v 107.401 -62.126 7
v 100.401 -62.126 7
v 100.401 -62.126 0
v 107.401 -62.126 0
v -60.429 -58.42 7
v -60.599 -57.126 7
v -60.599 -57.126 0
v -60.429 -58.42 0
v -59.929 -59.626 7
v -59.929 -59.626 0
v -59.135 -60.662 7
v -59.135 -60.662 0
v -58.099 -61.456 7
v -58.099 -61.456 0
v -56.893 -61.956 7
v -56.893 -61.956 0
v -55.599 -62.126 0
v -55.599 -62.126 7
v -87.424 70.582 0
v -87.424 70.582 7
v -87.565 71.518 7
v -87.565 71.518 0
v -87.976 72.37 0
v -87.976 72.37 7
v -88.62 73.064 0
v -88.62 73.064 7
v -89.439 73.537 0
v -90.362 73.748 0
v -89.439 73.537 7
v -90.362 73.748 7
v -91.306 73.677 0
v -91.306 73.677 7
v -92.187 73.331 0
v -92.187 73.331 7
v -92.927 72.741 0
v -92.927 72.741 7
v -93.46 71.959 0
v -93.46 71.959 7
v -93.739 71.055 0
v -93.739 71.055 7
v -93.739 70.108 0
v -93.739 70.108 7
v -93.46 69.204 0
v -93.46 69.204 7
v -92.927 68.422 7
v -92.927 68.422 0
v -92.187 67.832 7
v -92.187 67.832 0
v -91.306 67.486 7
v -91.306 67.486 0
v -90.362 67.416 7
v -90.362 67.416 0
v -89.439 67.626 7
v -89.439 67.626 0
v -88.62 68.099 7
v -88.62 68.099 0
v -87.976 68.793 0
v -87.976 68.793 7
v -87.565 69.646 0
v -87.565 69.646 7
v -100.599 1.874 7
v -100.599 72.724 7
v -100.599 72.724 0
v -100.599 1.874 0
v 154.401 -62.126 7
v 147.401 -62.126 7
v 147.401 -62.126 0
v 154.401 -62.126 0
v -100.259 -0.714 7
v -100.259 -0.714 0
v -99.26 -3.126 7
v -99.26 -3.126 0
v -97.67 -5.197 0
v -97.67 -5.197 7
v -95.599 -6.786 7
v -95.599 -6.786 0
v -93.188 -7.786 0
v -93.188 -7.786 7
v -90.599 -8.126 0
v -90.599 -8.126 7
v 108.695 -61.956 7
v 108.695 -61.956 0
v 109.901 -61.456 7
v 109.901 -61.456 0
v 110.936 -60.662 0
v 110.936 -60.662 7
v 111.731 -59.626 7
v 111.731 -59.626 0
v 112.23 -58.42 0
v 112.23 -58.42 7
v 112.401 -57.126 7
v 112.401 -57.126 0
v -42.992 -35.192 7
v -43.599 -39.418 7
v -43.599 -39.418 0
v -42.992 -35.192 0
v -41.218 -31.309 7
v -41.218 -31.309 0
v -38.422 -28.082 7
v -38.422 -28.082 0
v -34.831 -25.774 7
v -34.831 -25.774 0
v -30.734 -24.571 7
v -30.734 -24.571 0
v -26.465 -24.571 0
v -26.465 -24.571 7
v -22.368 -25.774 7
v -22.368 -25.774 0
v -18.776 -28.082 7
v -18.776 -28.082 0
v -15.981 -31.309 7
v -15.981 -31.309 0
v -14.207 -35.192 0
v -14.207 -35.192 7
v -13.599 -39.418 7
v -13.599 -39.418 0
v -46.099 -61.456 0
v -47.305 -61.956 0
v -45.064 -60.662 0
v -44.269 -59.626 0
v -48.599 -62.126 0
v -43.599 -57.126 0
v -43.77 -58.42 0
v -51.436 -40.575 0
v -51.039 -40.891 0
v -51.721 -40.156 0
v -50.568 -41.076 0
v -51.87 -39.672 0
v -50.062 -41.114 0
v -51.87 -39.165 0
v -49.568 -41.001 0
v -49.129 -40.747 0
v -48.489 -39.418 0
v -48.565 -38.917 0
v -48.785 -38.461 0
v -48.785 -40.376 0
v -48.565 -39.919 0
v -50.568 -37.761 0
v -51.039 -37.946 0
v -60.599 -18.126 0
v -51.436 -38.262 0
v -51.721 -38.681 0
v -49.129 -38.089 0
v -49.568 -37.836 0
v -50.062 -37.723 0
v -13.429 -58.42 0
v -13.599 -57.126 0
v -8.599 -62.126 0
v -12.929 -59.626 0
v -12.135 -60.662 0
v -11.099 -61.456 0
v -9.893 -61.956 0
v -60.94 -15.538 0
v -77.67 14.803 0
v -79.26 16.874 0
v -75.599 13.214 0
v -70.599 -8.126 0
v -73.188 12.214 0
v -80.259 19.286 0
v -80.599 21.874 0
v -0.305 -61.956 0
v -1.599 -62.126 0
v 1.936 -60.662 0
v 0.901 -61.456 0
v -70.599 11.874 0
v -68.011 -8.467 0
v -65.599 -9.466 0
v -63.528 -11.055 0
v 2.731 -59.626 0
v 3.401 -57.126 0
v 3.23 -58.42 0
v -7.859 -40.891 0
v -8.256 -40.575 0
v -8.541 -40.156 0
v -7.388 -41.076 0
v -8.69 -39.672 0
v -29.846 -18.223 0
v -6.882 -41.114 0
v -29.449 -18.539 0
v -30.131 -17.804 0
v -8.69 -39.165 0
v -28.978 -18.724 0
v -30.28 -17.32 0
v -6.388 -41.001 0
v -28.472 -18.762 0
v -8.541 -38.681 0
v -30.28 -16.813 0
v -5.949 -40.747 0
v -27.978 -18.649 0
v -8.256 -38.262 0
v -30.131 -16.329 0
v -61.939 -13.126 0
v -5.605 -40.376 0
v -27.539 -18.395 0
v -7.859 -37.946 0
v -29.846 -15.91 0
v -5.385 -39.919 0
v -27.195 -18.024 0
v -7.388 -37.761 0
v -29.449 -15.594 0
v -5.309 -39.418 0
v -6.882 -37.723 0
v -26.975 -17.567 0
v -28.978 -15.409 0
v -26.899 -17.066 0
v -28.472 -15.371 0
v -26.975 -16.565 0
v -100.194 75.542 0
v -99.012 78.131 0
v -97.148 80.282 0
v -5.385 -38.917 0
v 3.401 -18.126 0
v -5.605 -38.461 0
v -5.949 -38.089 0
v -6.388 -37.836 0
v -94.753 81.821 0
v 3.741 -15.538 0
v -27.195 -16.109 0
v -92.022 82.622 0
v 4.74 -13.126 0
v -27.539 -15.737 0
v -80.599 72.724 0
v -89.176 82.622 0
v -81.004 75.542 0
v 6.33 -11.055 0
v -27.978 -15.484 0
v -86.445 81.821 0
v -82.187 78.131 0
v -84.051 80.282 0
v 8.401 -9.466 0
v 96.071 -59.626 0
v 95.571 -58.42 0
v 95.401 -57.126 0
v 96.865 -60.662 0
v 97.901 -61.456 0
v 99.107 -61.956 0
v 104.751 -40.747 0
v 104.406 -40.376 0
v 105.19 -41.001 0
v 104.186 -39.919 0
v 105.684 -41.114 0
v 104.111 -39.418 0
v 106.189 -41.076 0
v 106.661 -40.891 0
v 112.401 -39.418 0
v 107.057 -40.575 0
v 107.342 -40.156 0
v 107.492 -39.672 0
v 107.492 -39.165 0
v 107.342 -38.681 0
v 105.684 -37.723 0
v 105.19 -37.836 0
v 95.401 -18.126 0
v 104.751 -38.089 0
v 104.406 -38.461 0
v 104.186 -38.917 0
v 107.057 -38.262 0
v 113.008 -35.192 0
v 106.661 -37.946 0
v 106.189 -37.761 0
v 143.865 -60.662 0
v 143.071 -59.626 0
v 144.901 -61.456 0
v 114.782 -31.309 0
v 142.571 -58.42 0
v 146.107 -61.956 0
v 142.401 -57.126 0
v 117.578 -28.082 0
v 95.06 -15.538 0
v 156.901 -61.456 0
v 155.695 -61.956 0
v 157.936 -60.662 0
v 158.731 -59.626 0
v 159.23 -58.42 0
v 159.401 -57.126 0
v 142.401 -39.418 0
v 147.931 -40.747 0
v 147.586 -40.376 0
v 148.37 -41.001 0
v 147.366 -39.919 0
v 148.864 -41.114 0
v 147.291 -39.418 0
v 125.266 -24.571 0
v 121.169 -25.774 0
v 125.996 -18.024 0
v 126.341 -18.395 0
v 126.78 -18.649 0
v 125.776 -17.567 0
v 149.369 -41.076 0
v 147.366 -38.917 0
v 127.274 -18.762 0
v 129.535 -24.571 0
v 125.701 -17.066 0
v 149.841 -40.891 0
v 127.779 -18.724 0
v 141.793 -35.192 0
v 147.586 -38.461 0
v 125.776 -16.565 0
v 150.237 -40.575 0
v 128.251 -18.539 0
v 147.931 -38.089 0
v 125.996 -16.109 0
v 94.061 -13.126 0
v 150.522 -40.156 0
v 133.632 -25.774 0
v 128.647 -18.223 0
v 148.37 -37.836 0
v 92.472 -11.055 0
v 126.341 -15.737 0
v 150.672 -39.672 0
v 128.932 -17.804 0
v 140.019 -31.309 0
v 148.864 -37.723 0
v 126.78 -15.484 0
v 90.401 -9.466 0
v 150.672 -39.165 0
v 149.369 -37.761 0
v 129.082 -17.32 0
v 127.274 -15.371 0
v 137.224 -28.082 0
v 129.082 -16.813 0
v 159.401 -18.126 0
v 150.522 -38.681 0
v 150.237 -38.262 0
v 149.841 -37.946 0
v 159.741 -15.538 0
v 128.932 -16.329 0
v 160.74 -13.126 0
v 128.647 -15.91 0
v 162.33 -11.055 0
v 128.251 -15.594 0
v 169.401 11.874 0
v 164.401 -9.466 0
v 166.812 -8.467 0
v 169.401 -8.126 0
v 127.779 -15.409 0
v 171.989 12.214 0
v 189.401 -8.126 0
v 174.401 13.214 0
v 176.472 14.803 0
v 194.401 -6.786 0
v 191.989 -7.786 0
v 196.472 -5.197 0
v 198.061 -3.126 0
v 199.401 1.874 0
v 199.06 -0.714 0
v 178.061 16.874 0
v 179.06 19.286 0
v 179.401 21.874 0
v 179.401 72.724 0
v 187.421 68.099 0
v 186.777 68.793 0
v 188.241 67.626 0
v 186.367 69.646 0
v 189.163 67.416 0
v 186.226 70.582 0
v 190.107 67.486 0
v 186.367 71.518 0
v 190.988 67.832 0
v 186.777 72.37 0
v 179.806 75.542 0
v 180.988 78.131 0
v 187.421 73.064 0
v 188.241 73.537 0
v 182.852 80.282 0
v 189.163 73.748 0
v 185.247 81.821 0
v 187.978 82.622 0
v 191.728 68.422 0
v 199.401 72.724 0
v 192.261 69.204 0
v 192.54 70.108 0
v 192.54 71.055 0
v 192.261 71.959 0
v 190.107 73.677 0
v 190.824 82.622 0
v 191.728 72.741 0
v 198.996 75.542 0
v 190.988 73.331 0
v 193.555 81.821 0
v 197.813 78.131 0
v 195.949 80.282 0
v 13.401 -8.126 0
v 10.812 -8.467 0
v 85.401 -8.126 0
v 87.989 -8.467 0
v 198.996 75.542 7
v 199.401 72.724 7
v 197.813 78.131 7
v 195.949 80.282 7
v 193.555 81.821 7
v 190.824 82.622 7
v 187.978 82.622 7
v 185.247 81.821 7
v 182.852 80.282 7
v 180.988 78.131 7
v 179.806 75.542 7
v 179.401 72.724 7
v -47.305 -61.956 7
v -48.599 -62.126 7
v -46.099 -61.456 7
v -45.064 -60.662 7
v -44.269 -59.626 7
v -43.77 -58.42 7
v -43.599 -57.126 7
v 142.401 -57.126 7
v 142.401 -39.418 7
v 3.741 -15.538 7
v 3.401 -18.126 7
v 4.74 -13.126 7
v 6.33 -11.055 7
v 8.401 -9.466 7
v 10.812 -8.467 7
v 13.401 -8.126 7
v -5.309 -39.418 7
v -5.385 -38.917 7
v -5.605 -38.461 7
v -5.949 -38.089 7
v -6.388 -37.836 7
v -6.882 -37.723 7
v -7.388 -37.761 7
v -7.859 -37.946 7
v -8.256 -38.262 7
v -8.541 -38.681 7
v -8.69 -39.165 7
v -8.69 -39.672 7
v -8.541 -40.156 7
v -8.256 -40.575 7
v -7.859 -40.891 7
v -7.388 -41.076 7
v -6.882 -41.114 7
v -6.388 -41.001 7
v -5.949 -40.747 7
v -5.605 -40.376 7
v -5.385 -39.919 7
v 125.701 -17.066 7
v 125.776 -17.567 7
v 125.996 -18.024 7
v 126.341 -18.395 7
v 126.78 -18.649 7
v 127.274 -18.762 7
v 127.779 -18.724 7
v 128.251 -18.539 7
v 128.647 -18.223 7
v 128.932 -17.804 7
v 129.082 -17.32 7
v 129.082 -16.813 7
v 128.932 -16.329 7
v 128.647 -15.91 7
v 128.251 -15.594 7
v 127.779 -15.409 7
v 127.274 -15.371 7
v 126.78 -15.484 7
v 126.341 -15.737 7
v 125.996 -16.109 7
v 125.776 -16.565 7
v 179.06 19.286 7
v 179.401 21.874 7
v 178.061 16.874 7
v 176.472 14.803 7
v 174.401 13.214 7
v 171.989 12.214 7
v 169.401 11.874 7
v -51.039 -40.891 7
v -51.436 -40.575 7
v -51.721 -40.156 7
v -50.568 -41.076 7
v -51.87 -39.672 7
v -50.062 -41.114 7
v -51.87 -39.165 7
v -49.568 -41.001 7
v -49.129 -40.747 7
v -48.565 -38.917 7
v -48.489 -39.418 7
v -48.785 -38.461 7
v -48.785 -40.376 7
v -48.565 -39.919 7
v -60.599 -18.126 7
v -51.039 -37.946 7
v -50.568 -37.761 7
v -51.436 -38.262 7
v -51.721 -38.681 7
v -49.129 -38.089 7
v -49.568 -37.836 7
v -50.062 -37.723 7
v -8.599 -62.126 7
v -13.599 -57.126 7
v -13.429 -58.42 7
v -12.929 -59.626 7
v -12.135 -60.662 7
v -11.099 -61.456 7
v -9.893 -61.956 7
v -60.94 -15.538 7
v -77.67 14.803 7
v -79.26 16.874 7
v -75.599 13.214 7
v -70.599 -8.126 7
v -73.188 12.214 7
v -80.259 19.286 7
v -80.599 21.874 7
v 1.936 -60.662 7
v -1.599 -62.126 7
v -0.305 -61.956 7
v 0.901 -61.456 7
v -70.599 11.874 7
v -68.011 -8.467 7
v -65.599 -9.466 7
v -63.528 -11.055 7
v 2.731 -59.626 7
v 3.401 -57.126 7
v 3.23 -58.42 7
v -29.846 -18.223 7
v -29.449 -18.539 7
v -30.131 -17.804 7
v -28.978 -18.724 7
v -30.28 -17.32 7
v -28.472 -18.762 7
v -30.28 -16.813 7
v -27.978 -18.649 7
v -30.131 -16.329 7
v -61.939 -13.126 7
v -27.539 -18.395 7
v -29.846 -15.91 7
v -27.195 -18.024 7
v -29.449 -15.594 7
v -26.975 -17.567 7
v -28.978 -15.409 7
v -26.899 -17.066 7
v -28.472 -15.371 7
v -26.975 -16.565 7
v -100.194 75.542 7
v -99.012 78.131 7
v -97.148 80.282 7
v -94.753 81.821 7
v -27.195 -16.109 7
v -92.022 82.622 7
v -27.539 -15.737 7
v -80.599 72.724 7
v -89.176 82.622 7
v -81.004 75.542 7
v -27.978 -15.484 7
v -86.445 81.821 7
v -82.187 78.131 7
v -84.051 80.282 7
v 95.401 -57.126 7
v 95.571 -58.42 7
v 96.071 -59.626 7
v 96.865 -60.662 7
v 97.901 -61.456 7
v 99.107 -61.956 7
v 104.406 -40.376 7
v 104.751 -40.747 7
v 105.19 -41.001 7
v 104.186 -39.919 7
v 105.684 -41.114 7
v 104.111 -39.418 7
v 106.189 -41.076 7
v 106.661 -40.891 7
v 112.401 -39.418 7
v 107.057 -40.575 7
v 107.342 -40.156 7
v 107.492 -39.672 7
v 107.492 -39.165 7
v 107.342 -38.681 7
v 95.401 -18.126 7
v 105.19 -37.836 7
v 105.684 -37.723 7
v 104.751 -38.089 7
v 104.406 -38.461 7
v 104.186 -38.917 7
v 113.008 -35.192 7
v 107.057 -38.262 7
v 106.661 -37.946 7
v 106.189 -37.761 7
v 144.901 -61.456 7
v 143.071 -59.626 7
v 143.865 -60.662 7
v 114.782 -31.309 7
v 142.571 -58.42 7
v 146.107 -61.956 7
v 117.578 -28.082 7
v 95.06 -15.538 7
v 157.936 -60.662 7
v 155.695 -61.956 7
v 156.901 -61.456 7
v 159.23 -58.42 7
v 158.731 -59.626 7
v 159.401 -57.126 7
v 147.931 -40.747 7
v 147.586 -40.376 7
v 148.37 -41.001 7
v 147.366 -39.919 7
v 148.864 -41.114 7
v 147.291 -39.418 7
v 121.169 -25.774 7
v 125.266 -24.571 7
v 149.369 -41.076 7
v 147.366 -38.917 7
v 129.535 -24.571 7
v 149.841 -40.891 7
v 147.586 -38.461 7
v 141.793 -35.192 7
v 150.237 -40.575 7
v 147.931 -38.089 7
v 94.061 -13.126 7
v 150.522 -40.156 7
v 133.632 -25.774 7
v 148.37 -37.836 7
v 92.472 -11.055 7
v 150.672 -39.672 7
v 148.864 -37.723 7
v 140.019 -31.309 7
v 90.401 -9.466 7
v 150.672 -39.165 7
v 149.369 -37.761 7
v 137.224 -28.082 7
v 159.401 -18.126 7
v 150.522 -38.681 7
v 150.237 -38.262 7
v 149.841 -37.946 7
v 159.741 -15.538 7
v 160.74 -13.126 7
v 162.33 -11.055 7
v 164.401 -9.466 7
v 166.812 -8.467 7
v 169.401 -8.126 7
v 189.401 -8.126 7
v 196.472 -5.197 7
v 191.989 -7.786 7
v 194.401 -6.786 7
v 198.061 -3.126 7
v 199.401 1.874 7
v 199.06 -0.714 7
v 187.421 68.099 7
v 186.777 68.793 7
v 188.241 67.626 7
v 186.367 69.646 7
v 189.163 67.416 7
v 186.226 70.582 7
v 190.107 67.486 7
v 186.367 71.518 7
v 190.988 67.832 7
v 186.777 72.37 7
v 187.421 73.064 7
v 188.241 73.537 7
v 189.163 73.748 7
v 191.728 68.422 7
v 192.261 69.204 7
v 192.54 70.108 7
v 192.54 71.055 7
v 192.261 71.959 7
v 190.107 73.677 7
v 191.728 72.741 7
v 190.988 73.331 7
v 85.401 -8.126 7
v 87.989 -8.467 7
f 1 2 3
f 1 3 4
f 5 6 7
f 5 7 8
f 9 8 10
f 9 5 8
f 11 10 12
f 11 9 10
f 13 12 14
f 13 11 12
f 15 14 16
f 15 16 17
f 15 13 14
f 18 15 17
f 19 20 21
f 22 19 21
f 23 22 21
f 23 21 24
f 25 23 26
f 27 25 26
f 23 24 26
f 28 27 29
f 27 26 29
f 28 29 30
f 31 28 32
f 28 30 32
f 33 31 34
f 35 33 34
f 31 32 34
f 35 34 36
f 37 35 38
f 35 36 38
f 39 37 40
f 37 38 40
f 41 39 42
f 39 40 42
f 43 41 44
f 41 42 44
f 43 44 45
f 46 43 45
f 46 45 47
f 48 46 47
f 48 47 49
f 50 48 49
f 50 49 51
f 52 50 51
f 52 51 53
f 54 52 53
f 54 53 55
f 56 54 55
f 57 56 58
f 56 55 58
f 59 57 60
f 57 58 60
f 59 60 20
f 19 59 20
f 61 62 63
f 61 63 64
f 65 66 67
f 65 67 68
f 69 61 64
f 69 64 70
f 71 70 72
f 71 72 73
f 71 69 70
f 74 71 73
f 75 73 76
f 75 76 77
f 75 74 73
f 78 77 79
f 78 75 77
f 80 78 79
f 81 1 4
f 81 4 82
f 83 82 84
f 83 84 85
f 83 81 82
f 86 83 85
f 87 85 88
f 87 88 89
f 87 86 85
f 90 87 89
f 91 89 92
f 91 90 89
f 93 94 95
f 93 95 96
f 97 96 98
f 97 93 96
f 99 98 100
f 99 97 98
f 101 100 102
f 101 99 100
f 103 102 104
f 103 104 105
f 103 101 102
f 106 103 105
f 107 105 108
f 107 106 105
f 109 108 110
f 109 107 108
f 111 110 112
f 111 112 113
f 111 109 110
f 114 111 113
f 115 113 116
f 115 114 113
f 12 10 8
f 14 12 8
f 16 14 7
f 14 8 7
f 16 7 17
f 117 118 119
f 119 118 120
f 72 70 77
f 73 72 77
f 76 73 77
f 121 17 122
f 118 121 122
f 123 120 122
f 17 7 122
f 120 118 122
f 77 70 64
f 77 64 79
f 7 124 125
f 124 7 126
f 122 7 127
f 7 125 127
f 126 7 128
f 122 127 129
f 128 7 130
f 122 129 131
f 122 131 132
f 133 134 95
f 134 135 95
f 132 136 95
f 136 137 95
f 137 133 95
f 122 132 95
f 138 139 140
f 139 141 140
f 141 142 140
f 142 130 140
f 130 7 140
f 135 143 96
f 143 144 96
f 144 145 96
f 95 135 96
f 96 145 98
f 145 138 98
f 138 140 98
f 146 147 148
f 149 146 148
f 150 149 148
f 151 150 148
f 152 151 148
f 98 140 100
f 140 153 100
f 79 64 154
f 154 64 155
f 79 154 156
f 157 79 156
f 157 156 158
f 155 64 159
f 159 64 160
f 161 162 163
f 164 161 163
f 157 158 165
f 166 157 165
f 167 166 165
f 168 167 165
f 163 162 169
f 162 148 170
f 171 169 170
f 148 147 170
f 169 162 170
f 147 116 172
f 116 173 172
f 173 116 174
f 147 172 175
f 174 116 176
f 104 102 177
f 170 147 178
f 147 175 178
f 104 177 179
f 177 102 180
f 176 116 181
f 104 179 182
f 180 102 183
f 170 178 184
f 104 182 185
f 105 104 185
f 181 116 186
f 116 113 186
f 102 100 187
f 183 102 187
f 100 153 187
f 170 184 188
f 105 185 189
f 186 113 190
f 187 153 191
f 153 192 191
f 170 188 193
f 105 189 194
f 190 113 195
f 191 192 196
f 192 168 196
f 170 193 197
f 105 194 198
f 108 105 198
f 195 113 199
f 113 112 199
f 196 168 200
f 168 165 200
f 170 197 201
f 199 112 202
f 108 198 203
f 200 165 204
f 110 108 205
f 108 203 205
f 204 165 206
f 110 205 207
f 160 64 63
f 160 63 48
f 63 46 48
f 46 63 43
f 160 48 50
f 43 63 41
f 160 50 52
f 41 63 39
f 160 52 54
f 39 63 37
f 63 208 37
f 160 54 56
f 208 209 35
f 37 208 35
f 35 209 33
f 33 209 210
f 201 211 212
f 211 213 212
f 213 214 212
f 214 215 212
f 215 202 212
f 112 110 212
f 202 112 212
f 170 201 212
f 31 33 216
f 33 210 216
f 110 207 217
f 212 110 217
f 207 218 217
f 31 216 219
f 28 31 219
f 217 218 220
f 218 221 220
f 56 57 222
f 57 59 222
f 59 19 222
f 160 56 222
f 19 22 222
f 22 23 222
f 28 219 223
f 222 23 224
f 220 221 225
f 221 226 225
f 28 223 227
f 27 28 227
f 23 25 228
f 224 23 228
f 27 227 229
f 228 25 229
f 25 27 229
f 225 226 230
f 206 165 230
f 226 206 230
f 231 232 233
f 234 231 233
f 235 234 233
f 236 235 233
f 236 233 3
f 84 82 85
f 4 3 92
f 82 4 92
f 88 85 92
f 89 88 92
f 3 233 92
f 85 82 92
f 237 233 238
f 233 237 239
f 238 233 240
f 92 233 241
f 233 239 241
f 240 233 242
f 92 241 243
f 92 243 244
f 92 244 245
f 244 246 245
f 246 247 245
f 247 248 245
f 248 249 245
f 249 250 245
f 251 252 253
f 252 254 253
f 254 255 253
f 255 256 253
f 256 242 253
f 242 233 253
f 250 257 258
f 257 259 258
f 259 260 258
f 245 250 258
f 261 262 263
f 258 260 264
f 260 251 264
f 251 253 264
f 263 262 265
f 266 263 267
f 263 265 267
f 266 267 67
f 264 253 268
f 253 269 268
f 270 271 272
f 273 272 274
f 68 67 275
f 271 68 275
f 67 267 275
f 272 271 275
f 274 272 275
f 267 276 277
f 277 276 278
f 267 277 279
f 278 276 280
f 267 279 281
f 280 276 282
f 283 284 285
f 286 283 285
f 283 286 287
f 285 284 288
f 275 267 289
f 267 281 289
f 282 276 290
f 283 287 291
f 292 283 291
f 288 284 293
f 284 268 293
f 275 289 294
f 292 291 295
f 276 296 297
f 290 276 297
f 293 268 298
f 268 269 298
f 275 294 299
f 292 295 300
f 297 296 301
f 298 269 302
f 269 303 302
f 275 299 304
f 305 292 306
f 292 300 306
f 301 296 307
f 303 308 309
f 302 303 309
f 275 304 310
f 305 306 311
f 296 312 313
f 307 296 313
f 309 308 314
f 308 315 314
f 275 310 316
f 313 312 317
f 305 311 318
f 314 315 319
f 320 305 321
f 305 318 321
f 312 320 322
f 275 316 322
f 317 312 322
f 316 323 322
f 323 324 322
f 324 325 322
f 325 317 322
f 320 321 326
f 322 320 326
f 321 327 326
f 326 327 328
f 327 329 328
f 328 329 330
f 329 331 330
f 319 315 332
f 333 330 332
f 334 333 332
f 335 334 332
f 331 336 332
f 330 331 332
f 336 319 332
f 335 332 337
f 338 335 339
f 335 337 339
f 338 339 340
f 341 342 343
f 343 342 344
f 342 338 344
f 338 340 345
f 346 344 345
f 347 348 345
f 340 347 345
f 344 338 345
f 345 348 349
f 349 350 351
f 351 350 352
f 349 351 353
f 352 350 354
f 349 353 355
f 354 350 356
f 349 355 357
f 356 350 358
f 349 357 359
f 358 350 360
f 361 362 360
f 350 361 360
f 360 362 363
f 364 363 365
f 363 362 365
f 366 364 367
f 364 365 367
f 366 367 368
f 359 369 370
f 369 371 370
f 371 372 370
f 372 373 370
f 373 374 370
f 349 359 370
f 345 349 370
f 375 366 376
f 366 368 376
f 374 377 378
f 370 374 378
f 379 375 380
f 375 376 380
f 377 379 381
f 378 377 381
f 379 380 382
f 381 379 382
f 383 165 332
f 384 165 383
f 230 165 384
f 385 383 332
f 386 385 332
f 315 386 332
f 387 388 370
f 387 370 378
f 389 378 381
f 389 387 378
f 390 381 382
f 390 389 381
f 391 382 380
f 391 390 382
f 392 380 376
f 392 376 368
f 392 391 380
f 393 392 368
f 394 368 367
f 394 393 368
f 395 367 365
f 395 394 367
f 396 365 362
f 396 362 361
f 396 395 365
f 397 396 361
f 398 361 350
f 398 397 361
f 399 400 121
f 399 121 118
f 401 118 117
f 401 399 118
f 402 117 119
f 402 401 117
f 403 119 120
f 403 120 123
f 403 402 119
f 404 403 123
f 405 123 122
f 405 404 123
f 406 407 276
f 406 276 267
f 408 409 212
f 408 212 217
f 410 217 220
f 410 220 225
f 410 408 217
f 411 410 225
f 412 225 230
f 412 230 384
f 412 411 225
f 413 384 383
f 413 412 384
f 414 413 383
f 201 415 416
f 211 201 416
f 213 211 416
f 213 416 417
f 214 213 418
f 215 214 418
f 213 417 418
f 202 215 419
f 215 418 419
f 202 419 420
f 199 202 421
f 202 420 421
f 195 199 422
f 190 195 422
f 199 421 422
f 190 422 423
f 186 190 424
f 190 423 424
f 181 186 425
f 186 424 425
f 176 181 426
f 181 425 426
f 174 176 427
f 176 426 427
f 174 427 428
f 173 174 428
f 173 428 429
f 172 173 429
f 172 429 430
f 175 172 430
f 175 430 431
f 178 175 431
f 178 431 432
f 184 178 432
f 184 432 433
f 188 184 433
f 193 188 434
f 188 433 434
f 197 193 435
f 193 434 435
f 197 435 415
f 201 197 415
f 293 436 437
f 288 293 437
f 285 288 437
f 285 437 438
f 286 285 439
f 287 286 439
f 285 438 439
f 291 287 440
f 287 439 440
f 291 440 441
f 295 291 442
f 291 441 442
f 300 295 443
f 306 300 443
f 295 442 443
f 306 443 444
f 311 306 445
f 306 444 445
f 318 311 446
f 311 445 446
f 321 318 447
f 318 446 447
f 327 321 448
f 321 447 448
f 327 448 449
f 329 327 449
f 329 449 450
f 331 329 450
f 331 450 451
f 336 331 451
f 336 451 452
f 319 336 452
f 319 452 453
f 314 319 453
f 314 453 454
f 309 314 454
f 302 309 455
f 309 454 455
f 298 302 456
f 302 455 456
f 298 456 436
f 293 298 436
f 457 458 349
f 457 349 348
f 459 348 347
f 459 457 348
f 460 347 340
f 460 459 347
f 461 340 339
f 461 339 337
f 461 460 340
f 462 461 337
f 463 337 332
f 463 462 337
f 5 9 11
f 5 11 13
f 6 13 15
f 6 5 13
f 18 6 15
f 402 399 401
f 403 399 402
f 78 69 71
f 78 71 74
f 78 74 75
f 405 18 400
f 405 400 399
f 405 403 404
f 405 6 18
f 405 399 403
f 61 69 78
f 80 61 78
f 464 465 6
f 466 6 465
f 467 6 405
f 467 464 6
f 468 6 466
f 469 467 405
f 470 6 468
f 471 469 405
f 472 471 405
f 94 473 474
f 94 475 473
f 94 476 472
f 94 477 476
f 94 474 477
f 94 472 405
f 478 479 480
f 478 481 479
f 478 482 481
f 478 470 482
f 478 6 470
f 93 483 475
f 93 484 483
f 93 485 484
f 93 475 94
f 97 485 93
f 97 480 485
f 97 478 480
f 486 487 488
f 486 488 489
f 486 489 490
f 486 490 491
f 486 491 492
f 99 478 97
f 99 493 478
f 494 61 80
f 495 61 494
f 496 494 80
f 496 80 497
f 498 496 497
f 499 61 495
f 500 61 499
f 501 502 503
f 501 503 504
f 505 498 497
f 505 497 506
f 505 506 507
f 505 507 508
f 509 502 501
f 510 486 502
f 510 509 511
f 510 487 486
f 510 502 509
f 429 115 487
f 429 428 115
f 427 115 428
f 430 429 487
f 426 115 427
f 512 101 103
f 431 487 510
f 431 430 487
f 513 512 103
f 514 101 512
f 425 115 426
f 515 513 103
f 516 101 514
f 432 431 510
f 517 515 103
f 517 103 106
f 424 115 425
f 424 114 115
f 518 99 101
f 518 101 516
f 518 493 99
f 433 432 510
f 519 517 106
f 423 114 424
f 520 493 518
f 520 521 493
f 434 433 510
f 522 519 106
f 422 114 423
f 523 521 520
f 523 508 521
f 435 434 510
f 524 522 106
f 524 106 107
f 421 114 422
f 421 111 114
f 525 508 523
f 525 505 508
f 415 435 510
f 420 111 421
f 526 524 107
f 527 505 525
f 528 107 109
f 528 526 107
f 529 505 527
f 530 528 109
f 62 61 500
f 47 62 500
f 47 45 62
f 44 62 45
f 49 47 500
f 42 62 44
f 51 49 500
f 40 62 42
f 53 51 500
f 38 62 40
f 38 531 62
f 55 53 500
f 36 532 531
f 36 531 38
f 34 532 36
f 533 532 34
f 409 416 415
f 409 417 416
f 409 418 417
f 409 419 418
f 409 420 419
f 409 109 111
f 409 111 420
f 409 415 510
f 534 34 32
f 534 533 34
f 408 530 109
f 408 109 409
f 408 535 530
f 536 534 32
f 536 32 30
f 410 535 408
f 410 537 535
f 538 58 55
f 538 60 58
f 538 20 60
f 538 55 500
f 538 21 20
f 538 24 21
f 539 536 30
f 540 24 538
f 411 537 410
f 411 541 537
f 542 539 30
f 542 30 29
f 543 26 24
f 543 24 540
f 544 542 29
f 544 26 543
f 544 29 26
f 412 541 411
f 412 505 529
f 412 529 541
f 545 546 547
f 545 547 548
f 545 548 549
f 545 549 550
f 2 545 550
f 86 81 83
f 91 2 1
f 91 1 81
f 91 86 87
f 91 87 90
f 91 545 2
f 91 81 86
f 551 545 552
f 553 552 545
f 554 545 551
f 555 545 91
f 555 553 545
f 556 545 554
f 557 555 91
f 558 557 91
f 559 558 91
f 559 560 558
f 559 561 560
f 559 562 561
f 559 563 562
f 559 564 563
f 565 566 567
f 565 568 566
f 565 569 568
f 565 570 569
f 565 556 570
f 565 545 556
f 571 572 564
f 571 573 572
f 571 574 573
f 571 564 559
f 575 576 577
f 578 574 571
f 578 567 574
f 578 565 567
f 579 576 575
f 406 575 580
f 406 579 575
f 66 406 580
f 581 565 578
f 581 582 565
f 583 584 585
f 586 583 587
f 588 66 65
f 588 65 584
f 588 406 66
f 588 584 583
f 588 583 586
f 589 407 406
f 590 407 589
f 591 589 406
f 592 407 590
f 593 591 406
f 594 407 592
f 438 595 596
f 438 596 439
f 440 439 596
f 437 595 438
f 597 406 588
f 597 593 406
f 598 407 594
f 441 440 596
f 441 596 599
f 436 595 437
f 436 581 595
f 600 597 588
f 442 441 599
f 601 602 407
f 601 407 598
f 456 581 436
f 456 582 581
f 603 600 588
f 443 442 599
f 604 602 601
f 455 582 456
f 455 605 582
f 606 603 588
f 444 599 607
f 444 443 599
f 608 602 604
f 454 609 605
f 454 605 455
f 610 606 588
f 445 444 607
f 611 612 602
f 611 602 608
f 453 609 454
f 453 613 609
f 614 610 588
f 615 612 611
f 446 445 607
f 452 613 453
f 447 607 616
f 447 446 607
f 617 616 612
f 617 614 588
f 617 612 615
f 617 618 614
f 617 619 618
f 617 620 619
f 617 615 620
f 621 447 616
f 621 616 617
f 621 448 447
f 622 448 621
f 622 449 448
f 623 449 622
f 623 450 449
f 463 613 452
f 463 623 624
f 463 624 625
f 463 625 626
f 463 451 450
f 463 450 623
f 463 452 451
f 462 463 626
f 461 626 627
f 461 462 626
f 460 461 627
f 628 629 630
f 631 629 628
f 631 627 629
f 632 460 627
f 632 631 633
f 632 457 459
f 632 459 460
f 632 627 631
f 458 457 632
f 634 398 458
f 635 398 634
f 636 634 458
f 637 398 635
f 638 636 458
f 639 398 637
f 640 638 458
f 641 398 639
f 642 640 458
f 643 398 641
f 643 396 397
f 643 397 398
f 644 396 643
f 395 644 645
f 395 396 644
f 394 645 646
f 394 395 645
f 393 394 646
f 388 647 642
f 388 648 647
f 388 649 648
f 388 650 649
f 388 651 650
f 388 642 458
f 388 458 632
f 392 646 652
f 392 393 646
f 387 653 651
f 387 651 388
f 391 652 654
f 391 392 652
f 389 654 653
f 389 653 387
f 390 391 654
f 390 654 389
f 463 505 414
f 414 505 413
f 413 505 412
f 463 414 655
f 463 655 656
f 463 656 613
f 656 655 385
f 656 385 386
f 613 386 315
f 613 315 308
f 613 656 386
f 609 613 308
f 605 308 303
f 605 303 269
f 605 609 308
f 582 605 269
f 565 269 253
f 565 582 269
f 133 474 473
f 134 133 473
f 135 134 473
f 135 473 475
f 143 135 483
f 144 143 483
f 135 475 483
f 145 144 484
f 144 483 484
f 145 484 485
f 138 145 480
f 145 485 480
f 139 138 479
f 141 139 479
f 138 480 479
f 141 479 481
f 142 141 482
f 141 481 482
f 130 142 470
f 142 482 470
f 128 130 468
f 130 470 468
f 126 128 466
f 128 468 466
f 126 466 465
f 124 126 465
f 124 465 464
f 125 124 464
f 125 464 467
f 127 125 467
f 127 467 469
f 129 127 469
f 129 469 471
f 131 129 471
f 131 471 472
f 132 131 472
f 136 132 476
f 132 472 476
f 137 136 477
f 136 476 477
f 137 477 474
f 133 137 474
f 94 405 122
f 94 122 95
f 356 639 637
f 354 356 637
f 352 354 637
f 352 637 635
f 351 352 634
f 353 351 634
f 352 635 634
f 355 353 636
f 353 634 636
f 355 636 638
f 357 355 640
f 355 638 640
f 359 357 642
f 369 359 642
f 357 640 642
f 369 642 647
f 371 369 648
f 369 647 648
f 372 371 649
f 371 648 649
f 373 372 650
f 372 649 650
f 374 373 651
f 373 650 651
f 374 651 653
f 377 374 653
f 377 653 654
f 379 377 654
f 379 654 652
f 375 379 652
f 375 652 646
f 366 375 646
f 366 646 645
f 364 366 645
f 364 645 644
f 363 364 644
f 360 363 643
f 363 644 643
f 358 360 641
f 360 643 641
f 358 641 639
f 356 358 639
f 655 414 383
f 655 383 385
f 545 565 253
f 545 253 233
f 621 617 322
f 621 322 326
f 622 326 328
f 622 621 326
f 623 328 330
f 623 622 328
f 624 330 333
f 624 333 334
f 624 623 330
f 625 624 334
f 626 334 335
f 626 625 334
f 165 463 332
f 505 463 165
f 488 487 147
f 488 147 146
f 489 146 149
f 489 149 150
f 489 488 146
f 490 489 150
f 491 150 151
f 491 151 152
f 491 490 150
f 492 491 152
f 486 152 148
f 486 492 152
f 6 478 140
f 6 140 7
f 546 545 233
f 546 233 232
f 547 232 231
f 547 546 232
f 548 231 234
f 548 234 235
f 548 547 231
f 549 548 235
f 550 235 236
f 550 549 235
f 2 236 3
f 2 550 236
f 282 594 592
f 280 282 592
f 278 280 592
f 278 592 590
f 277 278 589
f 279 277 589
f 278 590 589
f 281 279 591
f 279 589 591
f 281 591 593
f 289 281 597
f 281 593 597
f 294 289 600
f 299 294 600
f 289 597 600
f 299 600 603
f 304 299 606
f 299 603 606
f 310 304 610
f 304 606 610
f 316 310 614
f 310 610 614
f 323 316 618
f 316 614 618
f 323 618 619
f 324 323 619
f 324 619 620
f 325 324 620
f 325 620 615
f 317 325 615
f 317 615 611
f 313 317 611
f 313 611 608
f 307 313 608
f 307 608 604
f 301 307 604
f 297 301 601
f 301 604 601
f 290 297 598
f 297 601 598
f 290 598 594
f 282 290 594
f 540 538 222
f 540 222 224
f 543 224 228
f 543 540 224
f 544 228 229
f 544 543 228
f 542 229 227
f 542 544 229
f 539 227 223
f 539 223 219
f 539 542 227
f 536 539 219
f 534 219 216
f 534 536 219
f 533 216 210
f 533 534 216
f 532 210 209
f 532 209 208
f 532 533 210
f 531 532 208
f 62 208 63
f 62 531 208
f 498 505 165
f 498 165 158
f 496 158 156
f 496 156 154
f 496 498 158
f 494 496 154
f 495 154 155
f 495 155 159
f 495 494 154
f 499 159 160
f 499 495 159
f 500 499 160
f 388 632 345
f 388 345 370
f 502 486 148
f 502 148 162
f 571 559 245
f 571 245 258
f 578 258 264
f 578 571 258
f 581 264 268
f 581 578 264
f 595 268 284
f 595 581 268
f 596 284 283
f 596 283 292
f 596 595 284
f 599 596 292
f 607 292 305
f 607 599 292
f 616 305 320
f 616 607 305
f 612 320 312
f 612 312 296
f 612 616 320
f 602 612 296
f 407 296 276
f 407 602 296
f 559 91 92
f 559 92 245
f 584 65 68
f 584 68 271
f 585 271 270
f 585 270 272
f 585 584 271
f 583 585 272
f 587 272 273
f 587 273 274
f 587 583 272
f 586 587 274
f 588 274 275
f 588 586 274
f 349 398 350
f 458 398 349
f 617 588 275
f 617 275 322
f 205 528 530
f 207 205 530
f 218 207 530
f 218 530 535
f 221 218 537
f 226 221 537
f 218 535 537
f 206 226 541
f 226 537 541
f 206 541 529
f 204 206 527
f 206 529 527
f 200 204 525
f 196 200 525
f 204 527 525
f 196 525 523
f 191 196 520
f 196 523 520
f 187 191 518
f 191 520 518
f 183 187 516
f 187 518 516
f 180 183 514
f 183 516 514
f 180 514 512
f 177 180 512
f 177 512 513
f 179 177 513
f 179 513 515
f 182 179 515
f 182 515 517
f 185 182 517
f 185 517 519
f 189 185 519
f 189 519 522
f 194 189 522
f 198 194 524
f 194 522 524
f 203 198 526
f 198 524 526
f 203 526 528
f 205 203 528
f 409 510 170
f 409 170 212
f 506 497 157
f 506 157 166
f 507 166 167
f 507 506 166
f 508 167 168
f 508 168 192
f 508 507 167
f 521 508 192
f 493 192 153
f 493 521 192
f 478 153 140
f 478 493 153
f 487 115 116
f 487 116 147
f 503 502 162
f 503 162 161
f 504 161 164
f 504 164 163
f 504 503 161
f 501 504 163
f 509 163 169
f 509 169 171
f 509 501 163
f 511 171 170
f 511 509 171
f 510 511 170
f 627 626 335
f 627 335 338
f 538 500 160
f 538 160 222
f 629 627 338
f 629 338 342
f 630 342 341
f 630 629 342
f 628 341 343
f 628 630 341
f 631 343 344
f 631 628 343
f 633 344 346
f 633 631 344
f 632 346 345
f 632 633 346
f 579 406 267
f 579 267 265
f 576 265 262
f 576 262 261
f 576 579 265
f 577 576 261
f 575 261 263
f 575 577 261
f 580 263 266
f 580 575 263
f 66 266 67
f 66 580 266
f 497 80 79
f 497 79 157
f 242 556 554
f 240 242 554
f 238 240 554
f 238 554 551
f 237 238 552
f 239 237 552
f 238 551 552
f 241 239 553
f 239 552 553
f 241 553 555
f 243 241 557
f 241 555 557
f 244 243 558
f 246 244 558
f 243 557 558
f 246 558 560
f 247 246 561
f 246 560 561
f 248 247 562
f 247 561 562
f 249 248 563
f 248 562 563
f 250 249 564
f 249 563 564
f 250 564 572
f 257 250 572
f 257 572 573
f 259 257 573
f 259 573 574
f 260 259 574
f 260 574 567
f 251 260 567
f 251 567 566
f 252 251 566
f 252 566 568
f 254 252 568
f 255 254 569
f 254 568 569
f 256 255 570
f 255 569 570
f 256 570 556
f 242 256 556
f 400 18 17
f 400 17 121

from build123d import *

# Parameters (mm, degrees)
SKETCH1_R           = 1.7
SKETCH1_R_2         = 3.175
BOSS_EXTRUDE1_DEPTH = 7


with BuildPart() as part:
    # Sketch1 → Boss-Extrude1 (new body)
    with BuildSketch(Plane.XY.offset(7)):
        with BuildLine():
            Line((100.400666143, -62.126245847), (107.400666143, -62.126245847))
            ThreePointArc((107.400666143, -62.126245847), (110.936200049, -60.661779753), (112.400666143, -57.126245847))
            Line((112.400666143, -57.126245847), (112.400666143, -39.418346536))
            ThreePointArc((112.400666143, -39.418346536), (127.400666143, -24.418346536), (142.400666143, -39.418346536))
            Line((142.400666143, -39.418346536), (142.400666143, -57.126245847))
            ThreePointArc((142.400666143, -57.126245847), (143.865132237, -60.661779753), (147.400666143, -62.126245847))
            Line((147.400666143, -62.126245847), (154.400666143, -62.126245847))
            ThreePointArc((154.400666143, -62.126245847), (157.936200049, -60.661779753), (159.400666143, -57.126245847))
            Line((159.400666143, -57.126245847), (159.400666143, -18.126245847))
            ThreePointArc((159.400666143, -18.126245847), (162.329598331, -11.055178035), (169.400666143, -8.126245847))
            Line((169.400666143, -8.126245847), (189.400666143, -8.126245847))
            ThreePointArc((189.400666143, -8.126245847), (196.471733955, -5.197313659), (199.400666143, 1.873754153))
            Line((199.400666143, 1.873754153), (199.400666143, 72.724252492))
            ThreePointArc((199.400666143, 72.724252492), (189.400666143, 82.724252492), (179.400666143, 72.724252492))
            Line((179.400666143, 72.724252492), (179.400666143, 21.873754153))
            ThreePointArc((179.400666143, 21.873754153), (176.471733955, 14.802686341), (169.400666143, 11.873754153))
            Line((169.400666143, 11.873754153), (-70.599333857, 11.873754153))
            ThreePointArc((-70.599333857, 11.873754153), (-77.670401669, 14.802686341), (-80.599333857, 21.873754153))
            Line((-80.599333857, 21.873754153), (-80.599333857, 72.724252492))
            ThreePointArc((-80.599333857, 72.724252492), (-90.599333857, 82.724252492), (-100.599333857, 72.724252492))
            Line((-100.599333857, 72.724252492), (-100.599333857, 1.873754153))
            ThreePointArc((-100.599333857, 1.873754153), (-97.670401669, -5.197313659), (-90.599333857, -8.126245847))
            Line((-90.599333857, -8.126245847), (-70.599333857, -8.126245847))
            ThreePointArc((-70.599333857, -8.126245847), (-63.528266045, -11.055178035), (-60.599333857, -18.126245847))
            Line((-60.599333857, -18.126245847), (-60.599333857, -57.126245847))
            ThreePointArc((-60.599333857, -57.126245847), (-59.134867763, -60.661779753), (-55.599333857, -62.126245847))
            Line((-55.599333857, -62.126245847), (-48.599333857, -62.126245847))
            ThreePointArc((-48.599333857, -62.126245847), (-45.063799951, -60.661779753), (-43.599333857, -57.126245847))
            Line((-43.599333857, -57.126245847), (-43.599333857, -39.418346536))
            ThreePointArc((-43.599333857, -39.418346536), (-28.599333857, -24.418346536), (-13.599333857, -39.418346536))
            Line((-13.599333857, -39.418346536), (-13.599333857, -57.126245847))
            ThreePointArc((-13.599333857, -57.126245847), (-12.134867763, -60.661779753), (-8.599333857, -62.126245847))
            Line((-8.599333857, -62.126245847), (-1.599333857, -62.126245847))
            ThreePointArc((-1.599333857, -62.126245847), (1.936200049, -60.661779753), (3.400666143, -57.126245847))
            Line((3.400666143, -57.126245847), (3.400666143, -18.126245847))
            ThreePointArc((3.400666143, -18.126245847), (6.329598331, -11.055178035), (13.400666143, -8.126245847))
            Line((13.400666143, -8.126245847), (85.400666143, -8.126245847))
            ThreePointArc((85.400666143, -8.126245847), (92.471733955, -11.055178035), (95.400666143, -18.126245847))
            Line((95.400666143, -18.126245847), (95.400666143, -57.126245847))
            ThreePointArc((95.400666143, -57.126245847), (96.865132237, -60.661779753), (100.400666143, -62.126245847))
        make_face()
        with Locations((-50.189333857, -39.418346536)):
            Circle(SKETCH1_R, mode=Mode.SUBTRACT)
        with Locations((-7.009333857, -39.418346536)):
            Circle(SKETCH1_R, mode=Mode.SUBTRACT)
        with Locations((-28.599333857, -17.066346536)):
            Circle(SKETCH1_R, mode=Mode.SUBTRACT)
        with Locations((-90.599333857, 70.581653464)):
            Circle(SKETCH1_R_2, mode=Mode.SUBTRACT)
        with Locations(Location((189.400666143, 70.581653464, 0), (0, 0, 180))):
            Circle(SKETCH1_R_2, mode=Mode.SUBTRACT)
        with Locations(Location((127.400666143, -17.066346536, 0), (0, 0, 180))):
            Circle(SKETCH1_R, mode=Mode.SUBTRACT)
        with Locations(Location((105.810666143, -39.418346536, 0), (0, 0, 180))):
            Circle(SKETCH1_R, mode=Mode.SUBTRACT)
        with Locations(Location((148.990666143, -39.418346536, 0), (0, 0, 180))):
            Circle(SKETCH1_R, mode=Mode.SUBTRACT)
    extrude(amount=-BOSS_EXTRUDE1_DEPTH)


solid = part.part
